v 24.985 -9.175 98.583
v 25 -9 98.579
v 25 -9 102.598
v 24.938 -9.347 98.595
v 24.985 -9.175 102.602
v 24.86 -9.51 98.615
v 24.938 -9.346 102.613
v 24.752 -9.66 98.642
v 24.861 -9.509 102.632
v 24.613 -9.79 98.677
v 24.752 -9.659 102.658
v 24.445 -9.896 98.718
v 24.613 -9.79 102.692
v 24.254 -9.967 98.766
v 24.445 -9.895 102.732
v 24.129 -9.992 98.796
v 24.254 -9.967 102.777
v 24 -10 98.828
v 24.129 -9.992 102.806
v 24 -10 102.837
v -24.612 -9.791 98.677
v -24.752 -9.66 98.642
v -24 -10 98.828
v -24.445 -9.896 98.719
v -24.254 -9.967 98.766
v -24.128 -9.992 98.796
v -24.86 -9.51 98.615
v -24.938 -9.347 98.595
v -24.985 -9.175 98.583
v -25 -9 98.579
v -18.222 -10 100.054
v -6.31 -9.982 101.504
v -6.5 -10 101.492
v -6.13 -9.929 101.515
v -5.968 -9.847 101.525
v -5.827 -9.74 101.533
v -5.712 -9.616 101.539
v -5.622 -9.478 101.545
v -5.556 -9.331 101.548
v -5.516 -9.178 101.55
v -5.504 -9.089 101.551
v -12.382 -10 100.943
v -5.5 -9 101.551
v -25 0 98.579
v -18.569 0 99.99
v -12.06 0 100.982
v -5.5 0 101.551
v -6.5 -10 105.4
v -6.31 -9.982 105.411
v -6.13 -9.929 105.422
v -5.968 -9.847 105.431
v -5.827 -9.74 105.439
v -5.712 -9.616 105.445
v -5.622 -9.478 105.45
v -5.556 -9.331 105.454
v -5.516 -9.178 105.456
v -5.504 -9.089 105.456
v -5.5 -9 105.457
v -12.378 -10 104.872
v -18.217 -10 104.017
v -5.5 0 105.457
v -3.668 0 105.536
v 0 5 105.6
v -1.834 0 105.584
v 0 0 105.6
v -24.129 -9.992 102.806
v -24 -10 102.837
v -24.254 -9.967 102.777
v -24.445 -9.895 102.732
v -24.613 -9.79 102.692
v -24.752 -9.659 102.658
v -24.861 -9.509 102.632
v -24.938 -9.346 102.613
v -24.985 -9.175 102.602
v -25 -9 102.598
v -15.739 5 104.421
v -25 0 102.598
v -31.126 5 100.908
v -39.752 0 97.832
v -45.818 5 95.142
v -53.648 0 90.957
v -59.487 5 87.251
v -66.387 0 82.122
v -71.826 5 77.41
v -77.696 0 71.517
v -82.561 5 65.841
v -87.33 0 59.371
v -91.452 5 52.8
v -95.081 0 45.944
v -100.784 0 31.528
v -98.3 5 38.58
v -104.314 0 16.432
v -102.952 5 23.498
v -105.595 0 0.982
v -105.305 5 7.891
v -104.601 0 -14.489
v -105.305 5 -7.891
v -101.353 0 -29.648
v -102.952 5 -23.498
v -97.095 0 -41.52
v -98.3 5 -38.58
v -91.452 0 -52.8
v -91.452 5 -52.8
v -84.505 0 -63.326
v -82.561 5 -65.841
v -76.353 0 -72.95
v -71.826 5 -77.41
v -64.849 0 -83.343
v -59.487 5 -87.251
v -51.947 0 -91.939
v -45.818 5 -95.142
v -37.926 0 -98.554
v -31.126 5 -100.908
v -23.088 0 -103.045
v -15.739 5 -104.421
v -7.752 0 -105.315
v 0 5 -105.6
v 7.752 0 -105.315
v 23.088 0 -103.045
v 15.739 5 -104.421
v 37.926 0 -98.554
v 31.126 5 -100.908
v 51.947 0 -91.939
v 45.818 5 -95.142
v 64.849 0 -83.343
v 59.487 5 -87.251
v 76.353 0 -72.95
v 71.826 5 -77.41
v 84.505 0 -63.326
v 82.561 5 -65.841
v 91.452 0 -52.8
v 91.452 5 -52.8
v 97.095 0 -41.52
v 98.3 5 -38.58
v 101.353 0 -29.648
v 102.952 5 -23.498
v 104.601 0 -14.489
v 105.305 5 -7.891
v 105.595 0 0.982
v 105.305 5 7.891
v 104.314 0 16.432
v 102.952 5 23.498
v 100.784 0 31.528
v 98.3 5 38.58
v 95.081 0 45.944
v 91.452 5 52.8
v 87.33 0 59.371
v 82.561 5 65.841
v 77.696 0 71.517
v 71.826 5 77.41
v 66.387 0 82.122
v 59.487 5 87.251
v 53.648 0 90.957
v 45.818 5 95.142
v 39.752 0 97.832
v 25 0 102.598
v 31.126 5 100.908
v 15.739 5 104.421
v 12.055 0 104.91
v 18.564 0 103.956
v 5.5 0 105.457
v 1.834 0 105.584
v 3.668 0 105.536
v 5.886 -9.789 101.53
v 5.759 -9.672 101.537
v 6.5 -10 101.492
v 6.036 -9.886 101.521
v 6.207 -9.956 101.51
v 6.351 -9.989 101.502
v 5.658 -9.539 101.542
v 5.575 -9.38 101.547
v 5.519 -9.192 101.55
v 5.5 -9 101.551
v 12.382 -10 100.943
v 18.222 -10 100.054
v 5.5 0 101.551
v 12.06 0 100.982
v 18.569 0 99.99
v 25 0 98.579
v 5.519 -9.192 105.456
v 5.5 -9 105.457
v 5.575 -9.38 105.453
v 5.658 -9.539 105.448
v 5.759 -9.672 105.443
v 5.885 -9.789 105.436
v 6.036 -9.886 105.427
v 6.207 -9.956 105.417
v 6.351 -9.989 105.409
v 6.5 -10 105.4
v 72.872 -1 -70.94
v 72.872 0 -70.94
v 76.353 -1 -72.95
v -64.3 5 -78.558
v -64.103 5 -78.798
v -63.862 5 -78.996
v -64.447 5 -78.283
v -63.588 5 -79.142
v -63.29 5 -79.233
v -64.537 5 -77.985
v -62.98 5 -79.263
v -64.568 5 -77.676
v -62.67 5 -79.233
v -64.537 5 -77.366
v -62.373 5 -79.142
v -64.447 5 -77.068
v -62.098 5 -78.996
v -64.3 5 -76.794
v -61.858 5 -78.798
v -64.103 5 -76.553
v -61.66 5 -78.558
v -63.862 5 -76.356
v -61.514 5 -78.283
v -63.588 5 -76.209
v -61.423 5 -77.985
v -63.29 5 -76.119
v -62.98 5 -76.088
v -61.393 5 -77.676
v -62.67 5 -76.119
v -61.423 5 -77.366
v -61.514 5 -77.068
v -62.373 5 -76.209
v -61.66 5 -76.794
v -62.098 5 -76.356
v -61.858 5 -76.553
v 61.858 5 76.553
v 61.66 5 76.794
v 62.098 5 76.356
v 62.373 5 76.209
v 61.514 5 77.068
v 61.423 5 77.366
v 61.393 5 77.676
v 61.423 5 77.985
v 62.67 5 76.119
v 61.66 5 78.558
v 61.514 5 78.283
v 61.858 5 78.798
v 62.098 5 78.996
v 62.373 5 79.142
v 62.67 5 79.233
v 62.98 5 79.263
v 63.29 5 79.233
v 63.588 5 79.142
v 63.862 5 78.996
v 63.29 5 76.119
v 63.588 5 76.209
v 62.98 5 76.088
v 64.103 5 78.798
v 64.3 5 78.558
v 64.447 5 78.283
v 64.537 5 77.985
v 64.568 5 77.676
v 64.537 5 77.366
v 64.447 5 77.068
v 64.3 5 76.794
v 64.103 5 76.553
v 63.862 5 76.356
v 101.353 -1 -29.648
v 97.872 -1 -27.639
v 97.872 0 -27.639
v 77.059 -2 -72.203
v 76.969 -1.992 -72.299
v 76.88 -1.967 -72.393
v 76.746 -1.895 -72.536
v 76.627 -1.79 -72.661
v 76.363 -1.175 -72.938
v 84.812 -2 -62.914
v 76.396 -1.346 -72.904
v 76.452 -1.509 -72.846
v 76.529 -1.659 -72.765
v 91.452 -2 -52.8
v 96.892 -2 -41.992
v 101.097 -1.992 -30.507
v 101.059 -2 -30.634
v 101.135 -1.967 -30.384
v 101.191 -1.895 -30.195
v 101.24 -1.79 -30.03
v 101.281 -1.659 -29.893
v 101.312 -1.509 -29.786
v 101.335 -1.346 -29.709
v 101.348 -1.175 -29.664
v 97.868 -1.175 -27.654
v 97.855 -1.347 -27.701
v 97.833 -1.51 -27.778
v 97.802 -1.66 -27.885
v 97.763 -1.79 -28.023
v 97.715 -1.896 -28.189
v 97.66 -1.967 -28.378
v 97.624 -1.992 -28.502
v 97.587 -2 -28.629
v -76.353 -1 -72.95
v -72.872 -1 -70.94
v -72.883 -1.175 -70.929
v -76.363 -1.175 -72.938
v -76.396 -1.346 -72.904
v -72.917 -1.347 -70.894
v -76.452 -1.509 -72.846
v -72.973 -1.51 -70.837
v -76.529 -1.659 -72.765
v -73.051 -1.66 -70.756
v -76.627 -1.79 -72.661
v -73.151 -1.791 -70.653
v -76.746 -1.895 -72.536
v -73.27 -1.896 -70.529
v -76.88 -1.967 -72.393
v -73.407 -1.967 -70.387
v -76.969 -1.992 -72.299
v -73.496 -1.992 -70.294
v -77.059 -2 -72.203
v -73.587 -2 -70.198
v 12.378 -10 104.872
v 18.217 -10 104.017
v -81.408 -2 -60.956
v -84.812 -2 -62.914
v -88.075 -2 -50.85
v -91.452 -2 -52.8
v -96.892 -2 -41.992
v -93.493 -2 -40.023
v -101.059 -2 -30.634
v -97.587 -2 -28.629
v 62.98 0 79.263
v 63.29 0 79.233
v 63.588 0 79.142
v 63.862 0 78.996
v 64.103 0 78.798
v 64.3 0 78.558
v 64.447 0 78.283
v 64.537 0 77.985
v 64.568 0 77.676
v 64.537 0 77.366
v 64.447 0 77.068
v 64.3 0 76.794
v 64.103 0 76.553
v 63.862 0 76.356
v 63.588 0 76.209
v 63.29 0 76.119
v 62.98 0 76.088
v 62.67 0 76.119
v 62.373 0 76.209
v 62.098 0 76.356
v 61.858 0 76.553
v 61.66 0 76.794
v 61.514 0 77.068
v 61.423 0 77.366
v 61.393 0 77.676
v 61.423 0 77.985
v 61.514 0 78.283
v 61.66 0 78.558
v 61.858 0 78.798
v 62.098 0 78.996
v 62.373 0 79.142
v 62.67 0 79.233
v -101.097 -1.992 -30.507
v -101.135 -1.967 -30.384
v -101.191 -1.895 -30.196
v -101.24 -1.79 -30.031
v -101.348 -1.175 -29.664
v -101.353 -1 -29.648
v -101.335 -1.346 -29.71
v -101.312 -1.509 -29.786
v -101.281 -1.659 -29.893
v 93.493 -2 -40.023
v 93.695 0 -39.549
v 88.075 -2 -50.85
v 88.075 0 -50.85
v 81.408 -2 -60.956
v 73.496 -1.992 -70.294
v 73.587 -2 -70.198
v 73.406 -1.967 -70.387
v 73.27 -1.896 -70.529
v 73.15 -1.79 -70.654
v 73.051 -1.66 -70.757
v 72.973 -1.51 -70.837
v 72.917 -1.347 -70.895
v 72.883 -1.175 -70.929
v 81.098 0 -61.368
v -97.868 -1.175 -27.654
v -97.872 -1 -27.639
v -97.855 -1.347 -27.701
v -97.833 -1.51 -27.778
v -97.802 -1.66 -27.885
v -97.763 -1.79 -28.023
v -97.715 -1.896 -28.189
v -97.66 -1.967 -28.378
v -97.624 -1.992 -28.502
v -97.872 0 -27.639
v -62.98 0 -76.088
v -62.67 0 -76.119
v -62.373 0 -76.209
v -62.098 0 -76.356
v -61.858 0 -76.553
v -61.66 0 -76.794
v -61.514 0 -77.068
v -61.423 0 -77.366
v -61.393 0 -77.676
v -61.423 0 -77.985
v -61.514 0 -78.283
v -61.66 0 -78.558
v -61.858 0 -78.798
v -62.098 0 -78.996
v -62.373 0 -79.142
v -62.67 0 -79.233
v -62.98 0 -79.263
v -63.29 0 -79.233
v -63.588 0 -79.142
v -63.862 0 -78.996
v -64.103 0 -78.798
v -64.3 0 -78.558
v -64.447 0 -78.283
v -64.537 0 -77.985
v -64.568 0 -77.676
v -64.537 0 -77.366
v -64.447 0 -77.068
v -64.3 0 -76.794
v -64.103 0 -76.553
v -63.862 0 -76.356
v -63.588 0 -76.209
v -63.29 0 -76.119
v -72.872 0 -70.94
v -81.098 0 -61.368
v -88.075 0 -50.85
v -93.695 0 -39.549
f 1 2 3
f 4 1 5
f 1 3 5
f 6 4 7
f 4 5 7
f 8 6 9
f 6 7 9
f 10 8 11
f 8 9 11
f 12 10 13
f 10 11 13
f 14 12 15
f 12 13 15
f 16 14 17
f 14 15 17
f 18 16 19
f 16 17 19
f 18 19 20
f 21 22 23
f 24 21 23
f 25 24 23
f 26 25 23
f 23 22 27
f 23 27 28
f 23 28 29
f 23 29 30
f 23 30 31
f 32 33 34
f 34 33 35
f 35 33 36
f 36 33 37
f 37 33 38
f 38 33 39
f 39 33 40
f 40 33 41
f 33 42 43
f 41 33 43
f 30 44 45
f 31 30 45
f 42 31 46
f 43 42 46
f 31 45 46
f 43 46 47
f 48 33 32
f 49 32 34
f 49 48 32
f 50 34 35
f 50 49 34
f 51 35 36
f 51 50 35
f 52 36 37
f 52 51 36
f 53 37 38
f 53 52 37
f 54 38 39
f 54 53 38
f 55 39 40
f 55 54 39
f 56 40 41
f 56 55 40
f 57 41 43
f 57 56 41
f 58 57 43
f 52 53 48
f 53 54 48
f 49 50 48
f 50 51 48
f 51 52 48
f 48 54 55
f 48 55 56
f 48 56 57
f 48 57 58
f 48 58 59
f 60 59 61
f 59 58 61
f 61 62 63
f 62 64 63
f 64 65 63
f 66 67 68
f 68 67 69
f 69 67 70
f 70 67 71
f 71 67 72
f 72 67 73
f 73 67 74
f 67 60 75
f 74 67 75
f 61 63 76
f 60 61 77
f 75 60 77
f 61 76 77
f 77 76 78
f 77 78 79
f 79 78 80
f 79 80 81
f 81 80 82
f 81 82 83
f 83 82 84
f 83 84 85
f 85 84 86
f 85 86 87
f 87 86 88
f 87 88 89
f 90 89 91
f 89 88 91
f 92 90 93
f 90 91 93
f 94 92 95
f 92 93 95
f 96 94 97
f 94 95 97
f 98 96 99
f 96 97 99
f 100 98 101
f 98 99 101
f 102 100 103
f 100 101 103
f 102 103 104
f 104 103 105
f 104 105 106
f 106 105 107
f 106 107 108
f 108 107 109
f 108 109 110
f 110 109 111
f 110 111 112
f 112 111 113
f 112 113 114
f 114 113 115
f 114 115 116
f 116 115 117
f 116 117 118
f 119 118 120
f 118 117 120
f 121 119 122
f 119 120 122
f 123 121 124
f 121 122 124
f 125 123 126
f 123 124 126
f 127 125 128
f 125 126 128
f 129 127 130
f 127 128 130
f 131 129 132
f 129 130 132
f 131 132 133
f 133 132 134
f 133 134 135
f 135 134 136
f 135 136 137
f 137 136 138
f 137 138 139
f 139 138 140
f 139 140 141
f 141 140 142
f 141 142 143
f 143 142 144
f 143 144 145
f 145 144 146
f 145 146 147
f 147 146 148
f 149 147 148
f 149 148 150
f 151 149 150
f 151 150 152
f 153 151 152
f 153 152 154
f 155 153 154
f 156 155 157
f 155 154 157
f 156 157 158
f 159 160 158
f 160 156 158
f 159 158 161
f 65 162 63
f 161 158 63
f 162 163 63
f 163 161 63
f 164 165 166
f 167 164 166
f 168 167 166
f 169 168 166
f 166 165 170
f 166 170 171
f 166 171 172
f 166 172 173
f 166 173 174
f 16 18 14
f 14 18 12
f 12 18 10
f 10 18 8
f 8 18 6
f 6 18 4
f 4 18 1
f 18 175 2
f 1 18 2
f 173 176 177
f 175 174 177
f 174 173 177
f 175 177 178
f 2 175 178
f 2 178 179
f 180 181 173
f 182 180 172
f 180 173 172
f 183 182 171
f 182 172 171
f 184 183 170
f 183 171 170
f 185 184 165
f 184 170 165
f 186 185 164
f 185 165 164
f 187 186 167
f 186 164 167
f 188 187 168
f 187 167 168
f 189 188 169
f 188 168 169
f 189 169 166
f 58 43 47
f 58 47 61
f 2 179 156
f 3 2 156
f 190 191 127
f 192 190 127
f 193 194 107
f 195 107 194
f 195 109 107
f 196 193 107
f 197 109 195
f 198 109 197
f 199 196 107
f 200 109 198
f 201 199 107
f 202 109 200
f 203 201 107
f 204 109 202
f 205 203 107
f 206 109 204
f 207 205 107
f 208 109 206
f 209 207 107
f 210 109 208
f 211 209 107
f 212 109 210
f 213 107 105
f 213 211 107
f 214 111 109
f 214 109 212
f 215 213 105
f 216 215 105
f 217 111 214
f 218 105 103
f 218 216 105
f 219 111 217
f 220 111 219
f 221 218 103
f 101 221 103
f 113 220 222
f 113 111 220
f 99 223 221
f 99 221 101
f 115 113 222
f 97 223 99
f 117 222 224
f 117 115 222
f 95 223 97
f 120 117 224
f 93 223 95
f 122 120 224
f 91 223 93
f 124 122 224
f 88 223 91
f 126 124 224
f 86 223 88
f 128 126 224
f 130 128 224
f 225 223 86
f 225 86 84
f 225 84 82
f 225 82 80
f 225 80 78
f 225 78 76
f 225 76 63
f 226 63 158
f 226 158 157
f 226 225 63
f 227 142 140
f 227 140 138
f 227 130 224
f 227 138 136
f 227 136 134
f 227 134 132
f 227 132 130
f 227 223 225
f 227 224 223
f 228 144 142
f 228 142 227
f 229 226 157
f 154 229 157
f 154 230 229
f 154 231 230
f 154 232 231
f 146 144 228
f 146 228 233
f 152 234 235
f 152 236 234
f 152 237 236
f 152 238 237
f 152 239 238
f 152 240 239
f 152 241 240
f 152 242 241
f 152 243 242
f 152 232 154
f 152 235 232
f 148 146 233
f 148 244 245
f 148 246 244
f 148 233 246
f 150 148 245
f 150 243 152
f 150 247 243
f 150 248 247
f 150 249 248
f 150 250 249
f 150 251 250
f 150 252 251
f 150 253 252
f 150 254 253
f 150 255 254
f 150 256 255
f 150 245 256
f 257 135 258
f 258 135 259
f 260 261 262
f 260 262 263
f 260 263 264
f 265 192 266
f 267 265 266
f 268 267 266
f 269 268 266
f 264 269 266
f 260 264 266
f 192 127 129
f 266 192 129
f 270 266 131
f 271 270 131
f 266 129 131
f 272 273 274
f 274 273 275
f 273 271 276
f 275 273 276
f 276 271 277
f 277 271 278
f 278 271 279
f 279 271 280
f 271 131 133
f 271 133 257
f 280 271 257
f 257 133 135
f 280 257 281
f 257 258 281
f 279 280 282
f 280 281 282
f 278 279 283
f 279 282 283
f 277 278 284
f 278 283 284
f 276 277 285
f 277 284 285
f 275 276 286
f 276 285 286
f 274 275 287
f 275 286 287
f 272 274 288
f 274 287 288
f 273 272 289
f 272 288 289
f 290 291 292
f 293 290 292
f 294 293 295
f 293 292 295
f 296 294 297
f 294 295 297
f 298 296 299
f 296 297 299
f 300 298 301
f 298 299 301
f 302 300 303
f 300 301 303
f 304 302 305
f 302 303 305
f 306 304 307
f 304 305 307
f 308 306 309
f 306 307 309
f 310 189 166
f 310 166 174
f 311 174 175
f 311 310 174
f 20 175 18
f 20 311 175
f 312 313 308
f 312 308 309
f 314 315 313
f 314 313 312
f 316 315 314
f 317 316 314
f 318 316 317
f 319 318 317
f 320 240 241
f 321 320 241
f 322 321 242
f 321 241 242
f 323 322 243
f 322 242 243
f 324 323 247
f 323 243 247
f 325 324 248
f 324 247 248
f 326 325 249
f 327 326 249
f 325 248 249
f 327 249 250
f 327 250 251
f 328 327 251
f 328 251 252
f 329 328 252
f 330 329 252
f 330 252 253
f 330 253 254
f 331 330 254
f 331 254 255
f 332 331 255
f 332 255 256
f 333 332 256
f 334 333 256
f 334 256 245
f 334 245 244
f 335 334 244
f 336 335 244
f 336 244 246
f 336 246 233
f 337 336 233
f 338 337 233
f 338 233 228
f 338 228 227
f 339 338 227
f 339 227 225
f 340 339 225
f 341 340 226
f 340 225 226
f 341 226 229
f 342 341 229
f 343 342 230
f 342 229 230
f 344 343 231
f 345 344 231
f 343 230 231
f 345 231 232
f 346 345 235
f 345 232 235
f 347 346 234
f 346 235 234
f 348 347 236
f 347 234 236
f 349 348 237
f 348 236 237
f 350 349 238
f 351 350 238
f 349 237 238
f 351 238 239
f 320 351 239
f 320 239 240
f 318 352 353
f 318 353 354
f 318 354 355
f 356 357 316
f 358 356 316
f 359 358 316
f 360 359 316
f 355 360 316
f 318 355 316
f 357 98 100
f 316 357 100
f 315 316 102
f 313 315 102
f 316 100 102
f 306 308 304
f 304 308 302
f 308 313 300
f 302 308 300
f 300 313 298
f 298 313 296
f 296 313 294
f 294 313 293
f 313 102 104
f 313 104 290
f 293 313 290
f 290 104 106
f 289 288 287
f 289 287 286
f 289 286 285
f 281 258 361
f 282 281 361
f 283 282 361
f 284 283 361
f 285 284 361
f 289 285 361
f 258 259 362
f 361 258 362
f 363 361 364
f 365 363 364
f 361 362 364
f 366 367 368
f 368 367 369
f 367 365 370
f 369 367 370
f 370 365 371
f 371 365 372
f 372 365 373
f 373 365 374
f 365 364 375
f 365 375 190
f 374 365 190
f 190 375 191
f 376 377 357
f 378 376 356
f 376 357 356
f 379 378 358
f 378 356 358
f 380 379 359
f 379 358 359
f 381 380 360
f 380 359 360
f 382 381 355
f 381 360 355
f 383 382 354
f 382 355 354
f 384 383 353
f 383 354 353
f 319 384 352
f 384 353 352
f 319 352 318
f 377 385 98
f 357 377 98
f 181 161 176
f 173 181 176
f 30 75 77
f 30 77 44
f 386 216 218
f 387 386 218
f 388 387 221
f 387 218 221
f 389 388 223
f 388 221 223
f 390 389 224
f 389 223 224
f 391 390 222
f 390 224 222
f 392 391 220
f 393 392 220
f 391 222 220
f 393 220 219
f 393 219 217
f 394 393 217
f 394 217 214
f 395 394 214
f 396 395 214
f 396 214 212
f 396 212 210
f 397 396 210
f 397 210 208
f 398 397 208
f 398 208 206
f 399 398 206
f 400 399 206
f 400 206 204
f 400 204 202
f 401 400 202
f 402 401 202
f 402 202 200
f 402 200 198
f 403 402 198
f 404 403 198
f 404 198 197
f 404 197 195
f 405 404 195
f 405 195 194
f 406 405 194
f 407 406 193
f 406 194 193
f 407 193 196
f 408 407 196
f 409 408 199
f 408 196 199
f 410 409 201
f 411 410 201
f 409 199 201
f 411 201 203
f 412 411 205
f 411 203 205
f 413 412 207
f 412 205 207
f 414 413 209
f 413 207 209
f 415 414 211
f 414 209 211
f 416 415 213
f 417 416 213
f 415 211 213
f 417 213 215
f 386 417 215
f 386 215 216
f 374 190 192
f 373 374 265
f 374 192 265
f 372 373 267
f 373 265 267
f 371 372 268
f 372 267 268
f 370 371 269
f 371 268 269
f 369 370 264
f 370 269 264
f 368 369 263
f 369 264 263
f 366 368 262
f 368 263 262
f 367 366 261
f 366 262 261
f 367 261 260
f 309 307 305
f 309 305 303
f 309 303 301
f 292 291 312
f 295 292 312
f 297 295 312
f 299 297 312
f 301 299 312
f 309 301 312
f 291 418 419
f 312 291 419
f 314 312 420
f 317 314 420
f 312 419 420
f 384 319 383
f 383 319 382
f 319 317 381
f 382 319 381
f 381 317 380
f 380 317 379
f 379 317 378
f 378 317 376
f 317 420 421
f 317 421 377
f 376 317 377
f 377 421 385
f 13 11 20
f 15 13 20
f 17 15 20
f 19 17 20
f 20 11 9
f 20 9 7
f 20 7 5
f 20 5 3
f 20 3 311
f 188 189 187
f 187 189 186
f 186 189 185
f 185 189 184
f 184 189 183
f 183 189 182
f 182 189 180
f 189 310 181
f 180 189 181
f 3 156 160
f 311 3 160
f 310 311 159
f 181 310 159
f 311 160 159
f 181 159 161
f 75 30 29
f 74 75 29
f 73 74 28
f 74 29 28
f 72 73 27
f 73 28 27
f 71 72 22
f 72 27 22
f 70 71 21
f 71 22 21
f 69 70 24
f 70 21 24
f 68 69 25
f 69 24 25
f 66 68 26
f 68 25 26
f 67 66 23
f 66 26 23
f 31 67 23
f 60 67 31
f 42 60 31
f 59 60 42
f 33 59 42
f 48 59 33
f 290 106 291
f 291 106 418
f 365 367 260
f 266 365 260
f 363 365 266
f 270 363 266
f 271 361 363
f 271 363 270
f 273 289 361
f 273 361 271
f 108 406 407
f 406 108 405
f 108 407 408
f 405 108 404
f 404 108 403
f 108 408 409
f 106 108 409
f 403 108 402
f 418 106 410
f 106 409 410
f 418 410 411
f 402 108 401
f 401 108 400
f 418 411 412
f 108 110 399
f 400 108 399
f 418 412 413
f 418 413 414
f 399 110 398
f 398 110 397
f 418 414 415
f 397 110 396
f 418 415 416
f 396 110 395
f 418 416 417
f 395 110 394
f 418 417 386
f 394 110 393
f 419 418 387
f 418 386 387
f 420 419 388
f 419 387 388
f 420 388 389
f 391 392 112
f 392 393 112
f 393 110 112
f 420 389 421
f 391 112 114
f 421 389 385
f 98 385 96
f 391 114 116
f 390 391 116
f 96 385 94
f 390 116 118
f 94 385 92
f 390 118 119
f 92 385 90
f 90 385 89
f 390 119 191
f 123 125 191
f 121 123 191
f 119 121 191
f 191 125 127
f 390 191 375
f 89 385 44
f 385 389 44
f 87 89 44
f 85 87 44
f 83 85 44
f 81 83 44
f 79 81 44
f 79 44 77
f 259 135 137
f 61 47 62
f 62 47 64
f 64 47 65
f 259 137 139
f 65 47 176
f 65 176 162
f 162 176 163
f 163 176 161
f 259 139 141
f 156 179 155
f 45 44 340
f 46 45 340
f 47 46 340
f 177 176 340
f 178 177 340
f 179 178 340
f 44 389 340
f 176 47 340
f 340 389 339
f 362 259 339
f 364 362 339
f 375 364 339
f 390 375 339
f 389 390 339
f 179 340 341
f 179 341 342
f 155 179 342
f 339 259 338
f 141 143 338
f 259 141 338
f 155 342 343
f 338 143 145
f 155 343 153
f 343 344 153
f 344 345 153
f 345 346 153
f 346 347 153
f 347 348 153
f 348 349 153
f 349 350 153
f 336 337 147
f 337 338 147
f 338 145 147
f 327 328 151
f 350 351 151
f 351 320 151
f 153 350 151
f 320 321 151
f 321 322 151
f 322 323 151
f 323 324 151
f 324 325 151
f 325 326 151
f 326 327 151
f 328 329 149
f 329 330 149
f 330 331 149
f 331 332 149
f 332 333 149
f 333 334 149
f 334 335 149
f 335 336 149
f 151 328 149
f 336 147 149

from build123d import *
from build123d.topology import SkipClean

# Parameters (mm, degrees)
SKETCH1_R          = 105.6
EXTRUDE1_DEPTH     = 5
SKETCH2_R          = 1.5875
CUT_EXTRUDE1_DEPTH = 6
EXTRUDE2_DEPTH     = 10
CIRPATTERN1_COUNT  = 3
EXTRUDE3_DEPTH     = 10
EXTRUDE4_DEPTH     = 8
FILLET1_R          = 1


with BuildPart() as part:
    # Sketch1 → Extrude1 (new body)
    with BuildSketch(Plane(origin=(0, 0, 0), x_dir=(1, 0, 0), z_dir=(0, 1, 0))):
        with Locations(Location((0, 0, 0), (0, 0, 270))):  # turned: the seam where the file's is
            Circle(SKETCH1_R)
    extrude(amount=EXTRUDE1_DEPTH)

    # Sketch2 → Cut-Extrude1 (cut, through all)
    with BuildSketch(Plane(origin=(0, 5, 0), x_dir=(1, 0, 0), z_dir=(0, 1, 0))):
        with Locations(Location((-62.980195842, 77.675574872, 0), (0, 0, 270))):  # turned: the seam where the file's is
            Circle(SKETCH2_R)
        with Locations(Location((62.980195842, -77.675574872, 0), (0, 0, 270))):  # turned: the seam where the file's is
            Circle(SKETCH2_R)
    extrude(amount=-CUT_EXTRUDE1_DEPTH, mode=Mode.SUBTRACT)

    # Sketch3 → Extrude2 (add)
    with BuildSketch(Plane.XZ):
        with BuildLine():
            Line((-25, 102.598050664), (-25, 98.579358894))
            ThreePointArc((-25, 98.579358894), (0, 101.7), (25, 98.579358894))
            Line((25, 98.579358894), (25, 102.598050664))
            ThreePointArc((25, 102.598050664), (0, 105.6), (-25, 102.598050664))
        make_face()
    extrude2 = extrude(amount=EXTRUDE2_DEPTH)

    # CirPattern1: Extrude2 ×3 about axis
    with SkipClean():  # keep this step's faces unmerged: merging them makes the solid invalid here
        cirpattern1_axis = Axis((0, 0, 0), (0, 1, 0))
        for i in range(1, CIRPATTERN1_COUNT):
            add(extrude2.rotate(cirpattern1_axis, i * 360 / CIRPATTERN1_COUNT))

    # Sketch4 → Extrude3 (cut)
    with SkipClean():  # keep this step's faces unmerged: merging them makes the solid invalid here
        with BuildSketch(Plane.XZ.offset(10)):
            with BuildLine():
                Line((5.5, 105.456673568), (5.5, 101.551169368))
                ThreePointArc((5.5, 101.551169368), (0, 101.7), (-5.5, 101.551169368))
                Line((-5.5, 101.551169368), (-5.5, 105.456673568))
                ThreePointArc((-5.5, 105.456673568), (0, 105.6), (5.5, 105.456673568))
            make_face()
        extrude(amount=-EXTRUDE3_DEPTH, mode=Mode.SUBTRACT)

    # Sketch5 → Extrude4 (cut)
    with SkipClean():  # keep this step's faces unmerged: merging them makes the solid invalid here
        with BuildSketch(Plane.XZ.offset(10)):
            with BuildLine():
                Line((72.872229091, -70.940314542), (76.352518254, -72.949660426))
                ThreePointArc((76.352518254, -72.949660426), (91.45228264, -52.8), (101.352518254, -29.648390237))
                Line((101.352518254, -29.648390237), (97.872229091, -27.639044353))
                ThreePointArc((97.872229091, -27.639044353), (88.074783565, -50.85), (72.872229091, -70.940314542))
            make_face()
            with BuildLine():
                Line((-76.352518254, -72.949660426), (-72.872229091, -70.940314542))
                ThreePointArc((-72.872229091, -70.940314542), (-88.074783565, -50.85), (-97.872229091, -27.639044353))
                Line((-97.872229091, -27.639044353), (-101.352518254, -29.648390237))
                ThreePointArc((-101.352518254, -29.648390237), (-91.45228264, -52.8), (-76.352518254, -72.949660426))
            make_face()
        extrude(amount=-EXTRUDE4_DEPTH, mode=Mode.SUBTRACT)

    # Fillet1
    fillet1_edges = [part.edges().sort_by_distance(p)[0] for p in [
        (25, -10, 100.588704779),
        (5.5, -10, 103.503921468),
        (-5.5, -10, 103.503921468),
        (-25, -10, 100.588704779),
        (99.612373672, -2, -28.643717295),
        (74.612373672, -2, -71.944987484),
        (-74.612373672, -2, -71.944987484),
        (-99.612373672, -2, -28.643717295),
    ]]
    fillet(fillet1_edges, radius=FILLET1_R)


solid = part.part
